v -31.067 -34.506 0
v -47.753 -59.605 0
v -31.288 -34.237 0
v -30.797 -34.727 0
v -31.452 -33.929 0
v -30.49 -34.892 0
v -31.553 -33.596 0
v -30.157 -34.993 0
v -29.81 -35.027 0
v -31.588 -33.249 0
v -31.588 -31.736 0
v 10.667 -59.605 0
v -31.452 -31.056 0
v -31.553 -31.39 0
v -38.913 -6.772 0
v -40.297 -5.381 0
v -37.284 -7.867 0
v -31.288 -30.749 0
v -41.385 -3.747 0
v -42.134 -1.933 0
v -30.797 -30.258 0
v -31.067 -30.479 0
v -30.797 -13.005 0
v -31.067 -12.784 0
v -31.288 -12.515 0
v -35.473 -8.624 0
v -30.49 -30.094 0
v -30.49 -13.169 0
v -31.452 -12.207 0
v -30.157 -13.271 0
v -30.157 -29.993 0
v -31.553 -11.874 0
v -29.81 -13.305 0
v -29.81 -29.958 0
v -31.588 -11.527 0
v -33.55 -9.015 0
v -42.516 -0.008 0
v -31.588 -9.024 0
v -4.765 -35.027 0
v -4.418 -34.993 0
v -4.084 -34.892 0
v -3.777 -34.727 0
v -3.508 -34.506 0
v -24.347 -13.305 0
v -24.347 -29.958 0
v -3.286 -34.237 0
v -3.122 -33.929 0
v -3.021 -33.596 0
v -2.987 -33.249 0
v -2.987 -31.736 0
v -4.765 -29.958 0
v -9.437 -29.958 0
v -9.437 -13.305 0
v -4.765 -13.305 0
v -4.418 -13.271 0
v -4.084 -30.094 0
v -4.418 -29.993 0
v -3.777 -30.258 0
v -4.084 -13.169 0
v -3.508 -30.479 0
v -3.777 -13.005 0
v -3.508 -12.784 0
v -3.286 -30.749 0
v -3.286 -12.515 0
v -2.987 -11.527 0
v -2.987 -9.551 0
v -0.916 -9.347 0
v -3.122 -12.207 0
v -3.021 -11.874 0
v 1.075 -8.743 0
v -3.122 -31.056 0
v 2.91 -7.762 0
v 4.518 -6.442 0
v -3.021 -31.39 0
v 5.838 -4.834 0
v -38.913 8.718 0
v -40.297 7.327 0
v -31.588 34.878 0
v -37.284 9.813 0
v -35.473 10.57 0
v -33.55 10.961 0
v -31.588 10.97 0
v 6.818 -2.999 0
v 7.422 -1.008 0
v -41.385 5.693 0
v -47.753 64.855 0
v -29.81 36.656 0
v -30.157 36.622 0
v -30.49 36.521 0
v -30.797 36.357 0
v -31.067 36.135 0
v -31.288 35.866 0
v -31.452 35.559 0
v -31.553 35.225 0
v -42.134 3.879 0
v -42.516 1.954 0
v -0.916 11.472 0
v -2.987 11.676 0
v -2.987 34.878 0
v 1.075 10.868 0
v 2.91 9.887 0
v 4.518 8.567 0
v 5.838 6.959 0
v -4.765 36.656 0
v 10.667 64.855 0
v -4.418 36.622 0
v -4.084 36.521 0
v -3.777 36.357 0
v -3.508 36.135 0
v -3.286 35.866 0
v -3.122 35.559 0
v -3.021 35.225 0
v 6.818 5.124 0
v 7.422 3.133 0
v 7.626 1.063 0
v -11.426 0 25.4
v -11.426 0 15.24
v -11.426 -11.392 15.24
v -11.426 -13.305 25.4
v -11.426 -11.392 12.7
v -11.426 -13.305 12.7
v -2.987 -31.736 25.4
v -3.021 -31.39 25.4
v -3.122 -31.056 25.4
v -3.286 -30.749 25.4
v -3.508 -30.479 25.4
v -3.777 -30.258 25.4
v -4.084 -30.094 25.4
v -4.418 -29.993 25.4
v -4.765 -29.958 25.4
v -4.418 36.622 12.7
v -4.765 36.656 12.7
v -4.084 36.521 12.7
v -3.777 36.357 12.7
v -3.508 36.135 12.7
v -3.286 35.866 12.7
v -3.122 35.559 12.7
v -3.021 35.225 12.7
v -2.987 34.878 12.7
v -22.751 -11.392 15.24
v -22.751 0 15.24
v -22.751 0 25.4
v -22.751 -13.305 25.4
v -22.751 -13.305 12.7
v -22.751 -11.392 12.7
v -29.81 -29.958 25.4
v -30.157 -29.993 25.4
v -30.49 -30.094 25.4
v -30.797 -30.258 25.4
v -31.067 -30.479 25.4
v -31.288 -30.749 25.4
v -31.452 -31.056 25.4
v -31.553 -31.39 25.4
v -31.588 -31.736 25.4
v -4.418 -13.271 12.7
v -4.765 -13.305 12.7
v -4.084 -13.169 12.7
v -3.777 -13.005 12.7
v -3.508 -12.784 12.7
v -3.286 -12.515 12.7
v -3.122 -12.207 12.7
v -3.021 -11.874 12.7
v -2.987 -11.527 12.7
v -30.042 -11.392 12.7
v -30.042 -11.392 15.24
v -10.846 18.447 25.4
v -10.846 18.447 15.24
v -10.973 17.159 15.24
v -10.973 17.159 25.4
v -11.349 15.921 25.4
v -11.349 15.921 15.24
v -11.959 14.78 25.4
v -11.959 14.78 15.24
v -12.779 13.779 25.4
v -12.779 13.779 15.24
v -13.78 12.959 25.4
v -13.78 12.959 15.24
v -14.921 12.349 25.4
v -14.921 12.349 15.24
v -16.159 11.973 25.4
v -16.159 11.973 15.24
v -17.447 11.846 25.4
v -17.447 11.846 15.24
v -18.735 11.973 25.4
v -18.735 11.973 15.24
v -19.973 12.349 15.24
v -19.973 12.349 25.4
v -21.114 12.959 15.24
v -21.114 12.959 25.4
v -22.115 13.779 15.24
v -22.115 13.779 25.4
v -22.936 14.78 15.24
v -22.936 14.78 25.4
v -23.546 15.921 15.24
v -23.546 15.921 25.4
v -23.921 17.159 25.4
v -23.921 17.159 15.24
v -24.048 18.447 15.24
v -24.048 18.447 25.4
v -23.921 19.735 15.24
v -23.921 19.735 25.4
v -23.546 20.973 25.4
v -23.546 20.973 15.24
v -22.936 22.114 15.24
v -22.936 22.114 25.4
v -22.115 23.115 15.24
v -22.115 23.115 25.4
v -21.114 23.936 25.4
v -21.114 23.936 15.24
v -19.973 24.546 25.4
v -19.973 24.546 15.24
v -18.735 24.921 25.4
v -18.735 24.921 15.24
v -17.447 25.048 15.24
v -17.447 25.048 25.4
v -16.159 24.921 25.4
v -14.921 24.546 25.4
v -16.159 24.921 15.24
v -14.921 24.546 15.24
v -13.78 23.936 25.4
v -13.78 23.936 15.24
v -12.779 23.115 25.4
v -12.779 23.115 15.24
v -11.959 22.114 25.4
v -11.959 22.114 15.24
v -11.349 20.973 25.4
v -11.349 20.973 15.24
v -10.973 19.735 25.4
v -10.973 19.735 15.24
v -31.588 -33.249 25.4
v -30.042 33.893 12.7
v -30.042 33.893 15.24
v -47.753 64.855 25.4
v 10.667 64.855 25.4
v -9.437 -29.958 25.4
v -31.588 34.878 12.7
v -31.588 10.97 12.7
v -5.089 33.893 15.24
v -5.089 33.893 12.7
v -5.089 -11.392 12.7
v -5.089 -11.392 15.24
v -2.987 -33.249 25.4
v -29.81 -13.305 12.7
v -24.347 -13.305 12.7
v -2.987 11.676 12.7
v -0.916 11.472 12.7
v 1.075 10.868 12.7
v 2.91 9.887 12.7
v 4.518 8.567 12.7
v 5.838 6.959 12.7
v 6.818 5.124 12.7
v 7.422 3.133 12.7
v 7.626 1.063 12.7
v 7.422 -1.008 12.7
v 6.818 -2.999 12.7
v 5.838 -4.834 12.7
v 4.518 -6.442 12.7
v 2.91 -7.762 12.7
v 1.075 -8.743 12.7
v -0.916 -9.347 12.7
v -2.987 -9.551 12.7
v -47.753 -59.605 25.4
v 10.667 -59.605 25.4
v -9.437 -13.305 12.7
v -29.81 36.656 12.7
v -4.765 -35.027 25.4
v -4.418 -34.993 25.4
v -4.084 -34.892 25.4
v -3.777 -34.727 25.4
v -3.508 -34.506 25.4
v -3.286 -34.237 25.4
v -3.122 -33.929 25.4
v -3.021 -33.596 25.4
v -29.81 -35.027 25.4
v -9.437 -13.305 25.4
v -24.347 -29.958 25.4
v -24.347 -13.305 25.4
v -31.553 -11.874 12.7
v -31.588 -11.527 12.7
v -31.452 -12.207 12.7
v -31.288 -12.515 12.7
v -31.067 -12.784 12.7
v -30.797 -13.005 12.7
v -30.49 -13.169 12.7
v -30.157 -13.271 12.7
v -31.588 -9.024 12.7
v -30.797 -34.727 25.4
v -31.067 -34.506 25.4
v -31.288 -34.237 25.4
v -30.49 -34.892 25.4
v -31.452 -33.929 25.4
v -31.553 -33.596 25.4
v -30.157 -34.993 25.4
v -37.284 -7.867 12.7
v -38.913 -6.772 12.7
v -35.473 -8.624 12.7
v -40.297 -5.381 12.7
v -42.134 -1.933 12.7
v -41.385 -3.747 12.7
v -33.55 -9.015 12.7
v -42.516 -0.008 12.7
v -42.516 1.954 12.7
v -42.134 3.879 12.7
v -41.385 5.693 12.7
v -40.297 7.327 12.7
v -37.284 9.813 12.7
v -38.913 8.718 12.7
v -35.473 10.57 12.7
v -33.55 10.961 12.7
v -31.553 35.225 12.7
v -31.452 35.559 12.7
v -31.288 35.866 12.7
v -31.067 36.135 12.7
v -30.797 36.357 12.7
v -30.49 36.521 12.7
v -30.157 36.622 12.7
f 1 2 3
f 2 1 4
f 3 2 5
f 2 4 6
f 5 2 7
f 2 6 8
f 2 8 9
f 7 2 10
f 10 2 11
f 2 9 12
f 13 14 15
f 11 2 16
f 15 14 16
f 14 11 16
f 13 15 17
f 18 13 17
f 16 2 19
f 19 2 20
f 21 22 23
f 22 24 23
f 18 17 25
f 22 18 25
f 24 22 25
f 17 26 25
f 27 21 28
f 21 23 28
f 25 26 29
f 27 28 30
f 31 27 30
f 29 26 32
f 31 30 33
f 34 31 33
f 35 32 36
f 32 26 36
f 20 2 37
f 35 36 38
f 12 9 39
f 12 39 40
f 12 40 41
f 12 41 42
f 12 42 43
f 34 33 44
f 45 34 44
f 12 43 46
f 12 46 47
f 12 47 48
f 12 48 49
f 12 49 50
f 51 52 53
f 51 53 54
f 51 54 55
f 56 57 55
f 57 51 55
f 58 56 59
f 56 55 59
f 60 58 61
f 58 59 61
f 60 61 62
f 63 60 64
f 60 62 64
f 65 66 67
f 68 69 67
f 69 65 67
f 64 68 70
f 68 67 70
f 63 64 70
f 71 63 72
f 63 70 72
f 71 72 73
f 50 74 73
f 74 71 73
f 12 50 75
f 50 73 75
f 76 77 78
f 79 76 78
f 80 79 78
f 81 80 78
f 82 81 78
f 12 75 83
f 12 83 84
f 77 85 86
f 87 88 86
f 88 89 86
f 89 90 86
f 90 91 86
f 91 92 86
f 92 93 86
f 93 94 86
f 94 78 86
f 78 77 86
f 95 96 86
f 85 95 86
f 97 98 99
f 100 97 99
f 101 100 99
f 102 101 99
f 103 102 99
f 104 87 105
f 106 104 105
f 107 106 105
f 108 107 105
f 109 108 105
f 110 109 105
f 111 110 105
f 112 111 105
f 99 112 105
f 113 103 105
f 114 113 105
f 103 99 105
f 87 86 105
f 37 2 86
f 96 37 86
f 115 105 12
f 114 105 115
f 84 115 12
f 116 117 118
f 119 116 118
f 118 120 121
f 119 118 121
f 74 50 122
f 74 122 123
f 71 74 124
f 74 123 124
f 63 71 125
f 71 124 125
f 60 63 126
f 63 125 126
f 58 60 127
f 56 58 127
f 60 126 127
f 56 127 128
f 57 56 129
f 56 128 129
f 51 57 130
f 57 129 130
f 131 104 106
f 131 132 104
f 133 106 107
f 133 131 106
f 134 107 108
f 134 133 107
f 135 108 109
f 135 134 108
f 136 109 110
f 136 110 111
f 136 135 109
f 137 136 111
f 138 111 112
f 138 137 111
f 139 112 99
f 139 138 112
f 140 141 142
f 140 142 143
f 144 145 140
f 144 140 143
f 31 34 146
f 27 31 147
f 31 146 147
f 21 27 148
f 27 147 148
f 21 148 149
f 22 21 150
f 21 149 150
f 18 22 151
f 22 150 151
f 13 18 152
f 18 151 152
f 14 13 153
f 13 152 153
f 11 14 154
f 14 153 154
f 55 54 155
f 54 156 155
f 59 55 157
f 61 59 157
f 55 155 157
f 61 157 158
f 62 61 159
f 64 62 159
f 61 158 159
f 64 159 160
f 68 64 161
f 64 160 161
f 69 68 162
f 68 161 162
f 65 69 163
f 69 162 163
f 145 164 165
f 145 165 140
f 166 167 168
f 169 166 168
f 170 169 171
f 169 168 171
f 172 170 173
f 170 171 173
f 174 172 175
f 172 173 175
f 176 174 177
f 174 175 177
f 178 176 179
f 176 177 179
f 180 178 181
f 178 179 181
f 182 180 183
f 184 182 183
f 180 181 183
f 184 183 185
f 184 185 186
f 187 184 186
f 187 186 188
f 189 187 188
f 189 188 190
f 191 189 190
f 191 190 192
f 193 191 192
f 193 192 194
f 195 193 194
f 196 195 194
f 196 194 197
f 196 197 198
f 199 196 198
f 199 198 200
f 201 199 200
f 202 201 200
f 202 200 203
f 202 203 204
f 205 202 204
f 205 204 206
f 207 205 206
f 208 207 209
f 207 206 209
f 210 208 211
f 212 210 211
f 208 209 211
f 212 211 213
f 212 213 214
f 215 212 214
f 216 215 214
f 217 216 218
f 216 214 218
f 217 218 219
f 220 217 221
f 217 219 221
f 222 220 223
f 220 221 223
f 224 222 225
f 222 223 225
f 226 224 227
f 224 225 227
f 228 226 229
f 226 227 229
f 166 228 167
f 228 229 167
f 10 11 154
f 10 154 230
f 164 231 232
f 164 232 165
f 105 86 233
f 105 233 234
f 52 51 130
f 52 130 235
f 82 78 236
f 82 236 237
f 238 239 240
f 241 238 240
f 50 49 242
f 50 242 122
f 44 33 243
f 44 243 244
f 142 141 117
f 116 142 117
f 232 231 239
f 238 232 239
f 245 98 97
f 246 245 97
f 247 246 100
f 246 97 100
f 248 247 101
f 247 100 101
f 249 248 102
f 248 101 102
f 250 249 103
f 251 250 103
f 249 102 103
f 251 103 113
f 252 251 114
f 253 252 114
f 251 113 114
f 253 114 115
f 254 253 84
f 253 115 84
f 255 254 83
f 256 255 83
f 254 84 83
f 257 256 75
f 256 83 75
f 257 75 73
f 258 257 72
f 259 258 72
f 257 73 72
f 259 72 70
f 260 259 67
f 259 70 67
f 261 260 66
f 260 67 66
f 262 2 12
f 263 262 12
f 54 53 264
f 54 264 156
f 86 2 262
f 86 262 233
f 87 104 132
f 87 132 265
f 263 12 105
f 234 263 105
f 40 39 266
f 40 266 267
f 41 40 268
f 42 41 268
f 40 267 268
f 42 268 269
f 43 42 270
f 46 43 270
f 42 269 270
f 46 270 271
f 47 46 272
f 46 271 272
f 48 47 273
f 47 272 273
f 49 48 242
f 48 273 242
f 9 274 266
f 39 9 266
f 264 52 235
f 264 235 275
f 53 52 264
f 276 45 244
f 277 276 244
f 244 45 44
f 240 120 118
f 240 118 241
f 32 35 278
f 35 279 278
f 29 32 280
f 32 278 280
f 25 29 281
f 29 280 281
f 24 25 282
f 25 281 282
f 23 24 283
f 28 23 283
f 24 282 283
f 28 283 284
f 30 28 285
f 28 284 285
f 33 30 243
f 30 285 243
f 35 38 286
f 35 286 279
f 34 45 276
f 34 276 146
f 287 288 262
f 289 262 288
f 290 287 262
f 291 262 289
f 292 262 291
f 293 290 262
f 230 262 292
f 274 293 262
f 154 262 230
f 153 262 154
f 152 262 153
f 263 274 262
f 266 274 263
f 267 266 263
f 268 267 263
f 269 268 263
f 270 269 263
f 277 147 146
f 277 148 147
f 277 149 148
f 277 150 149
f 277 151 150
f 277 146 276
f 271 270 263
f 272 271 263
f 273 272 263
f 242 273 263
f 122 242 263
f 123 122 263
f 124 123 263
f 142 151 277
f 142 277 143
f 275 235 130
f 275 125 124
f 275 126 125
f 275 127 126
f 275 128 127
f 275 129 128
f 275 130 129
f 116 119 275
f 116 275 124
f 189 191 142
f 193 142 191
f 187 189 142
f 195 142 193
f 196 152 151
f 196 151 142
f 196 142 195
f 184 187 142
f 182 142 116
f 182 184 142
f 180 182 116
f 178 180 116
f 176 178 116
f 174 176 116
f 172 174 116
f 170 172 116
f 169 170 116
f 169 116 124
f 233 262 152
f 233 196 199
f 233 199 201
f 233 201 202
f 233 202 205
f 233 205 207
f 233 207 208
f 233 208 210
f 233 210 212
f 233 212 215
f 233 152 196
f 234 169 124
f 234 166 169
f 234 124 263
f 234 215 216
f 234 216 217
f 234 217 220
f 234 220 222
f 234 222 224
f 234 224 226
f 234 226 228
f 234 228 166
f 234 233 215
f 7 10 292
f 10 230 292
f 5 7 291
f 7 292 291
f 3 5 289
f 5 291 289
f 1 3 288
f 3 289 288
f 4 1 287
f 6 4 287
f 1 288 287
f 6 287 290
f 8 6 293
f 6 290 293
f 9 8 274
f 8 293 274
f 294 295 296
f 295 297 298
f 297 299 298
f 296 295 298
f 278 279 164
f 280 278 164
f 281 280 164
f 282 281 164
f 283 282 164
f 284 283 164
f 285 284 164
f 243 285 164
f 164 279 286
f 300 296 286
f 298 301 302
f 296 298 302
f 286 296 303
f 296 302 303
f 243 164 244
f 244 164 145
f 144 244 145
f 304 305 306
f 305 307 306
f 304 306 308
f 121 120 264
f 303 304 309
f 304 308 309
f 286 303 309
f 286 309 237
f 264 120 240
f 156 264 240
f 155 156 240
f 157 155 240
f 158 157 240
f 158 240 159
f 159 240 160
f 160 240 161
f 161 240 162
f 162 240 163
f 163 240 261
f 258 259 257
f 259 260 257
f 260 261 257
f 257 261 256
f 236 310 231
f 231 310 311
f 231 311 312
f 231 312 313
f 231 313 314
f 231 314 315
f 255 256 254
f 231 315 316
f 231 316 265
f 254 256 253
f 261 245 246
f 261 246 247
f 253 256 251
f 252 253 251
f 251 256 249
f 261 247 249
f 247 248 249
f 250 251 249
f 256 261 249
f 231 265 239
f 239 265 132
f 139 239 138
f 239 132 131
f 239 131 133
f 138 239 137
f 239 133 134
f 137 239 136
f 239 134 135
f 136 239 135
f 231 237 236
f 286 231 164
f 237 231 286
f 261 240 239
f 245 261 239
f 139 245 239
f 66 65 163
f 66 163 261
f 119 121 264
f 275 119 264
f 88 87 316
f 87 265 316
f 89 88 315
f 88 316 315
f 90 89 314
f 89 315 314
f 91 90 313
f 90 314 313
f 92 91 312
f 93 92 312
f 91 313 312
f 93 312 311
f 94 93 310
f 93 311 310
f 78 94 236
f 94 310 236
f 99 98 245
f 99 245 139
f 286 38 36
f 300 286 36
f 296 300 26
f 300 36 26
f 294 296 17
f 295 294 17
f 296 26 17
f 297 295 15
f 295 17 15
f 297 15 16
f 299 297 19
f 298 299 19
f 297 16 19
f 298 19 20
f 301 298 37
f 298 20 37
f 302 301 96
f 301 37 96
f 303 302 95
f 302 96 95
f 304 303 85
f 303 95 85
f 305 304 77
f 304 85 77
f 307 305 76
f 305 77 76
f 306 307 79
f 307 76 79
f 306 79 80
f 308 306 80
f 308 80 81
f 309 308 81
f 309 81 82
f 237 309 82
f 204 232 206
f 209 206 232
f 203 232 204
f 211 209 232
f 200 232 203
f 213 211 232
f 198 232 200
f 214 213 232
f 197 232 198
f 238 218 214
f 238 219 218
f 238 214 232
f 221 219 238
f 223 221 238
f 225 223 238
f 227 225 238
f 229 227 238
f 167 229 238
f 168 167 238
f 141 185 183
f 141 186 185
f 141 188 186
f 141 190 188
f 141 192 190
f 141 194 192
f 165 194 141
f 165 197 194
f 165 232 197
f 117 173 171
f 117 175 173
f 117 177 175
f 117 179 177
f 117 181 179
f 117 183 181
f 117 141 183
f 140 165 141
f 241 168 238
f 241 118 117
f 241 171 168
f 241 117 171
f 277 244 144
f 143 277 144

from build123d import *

# Parameters (mm, degrees)
F0_W      = 58.42
F0_H      = 124.46
F1_DEPTH  = 25.4
F3_DEPTH  = 12.7
F2_W      = 14.9100571871
F2_H      = 16.6536653414
F4_DEPTH  = 25.401
F5_DEPTH  = 25.401
F6_R      = 1.778
F8_DEPTH  = 12.7
F9_R      = 6.600990786
F10_DEPTH = 12.701
F12_W     = 24.9527078122
F12_H     = 45.2845413238
F13_DEPTH = 2.54
F14_W     = 11.3247931004
F14_H     = 17.1568840742
F15_DEPTH = 12.701


with BuildPart() as f1:
    # F0 (on Top) → F1 (new body)
    with BuildSketch(Plane.XY):
        with Locations((-18.5432793882, 2.6247613132)):
            Rectangle(F0_W, F0_H)
    extrude(amount=F1_DEPTH)

    # F2 (on Top) → F3 (cut)
    with BuildSketch(Plane.XY):
        Polygon((-2.9867999256, 36.6561636329), (-31.5876603127, 36.6561636329), (-31.5876603127, -13.3048305288), (-24.3469346315, -13.3048305288), (-9.4368774444, -13.3048305288), (-2.9867999256, -13.3048305288), align=None)
    extrude(amount=F3_DEPTH, mode=Mode.SUBTRACT)

    # F2 (on Top) → F4 (cut, through all)
    with BuildSketch(Plane.XY):
        with Locations((-16.8919060379, -21.6316631995)):
            Rectangle(F2_W, F2_H)
    extrude(amount=F4_DEPTH, mode=Mode.SUBTRACT)

    # F2 (on Top) → F5 (cut, through all)
    with BuildSketch(Plane.XY):
        Polygon((-9.4368774444, -29.9584958702), (-24.3469346315, -29.9584958702), (-31.5876603127, -29.9584958702), (-31.5876603127, -35.0270010531), (-2.9867999256, -35.0270010531), (-2.9867999256, -29.9584958702), align=None)
    extrude(amount=F5_DEPTH, mode=Mode.SUBTRACT)

    # F6
    f6_edges = [f1.edges().sort_by_distance(p)[0] for p in [
        (-2.9868, -35.027001, 12.7),
        (-2.9868, -13.304831, 6.35),
        (-2.9868, -29.958496, 12.7),
        (-2.9868, 36.656164, 6.35),
        (-31.58766, 36.656164, 6.35),
        (-31.58766, -13.304831, 6.35),
        (-31.58766, -29.958496, 12.7),
        (-31.58766, -35.027001, 12.7),
    ]]
    fillet(f6_edges, radius=F6_R)

    # F7 (on face) → F8 (cut)
    with BuildSketch(Plane(origin=(0, 0, 0), x_dir=(1, 0, 0), z_dir=(0, 0, -1))):
        with BuildLine():
            Line((-31.5876603127, -10.9698253981), (-31.5876603127, 9.0240317161))
            ThreePointArc((-31.5876603127, 9.0240317161), (-42.5635968021, -0.972896841), (-31.5876603127, -10.9698253981))
        make_face()
        with BuildLine():
            Line((-2.9867999256, 9.5505814534), (-2.9867999256, -11.675666552))
            ThreePointArc((-2.9867999256, -11.675666552), (7.6263240771, -1.0625425493), (-2.9867999256, 9.5505814534))
        make_face()
    extrude(amount=-F8_DEPTH, mode=Mode.SUBTRACT)

    # F9 (on face) → F10 (cut, through all)
    with BuildSketch(Plane(origin=(0, 0, 12.7), x_dir=(1, 0, 0), z_dir=(0, 0, -1))):
        with Locations((-17.4470897764, -18.4470508248)):
            Circle(F9_R)
    extrude(amount=-F10_DEPTH, mode=Mode.SUBTRACT)

    # F12 (on face) → F13 (cut)
    with BuildSketch(Plane(origin=(0, 0, 12.7), x_dir=(1, 0, 0), z_dir=(0, 0, -1))):
        with Locations((-17.5654711202, -11.2502751872)):
            Rectangle(F12_W, F12_H)
    extrude(amount=-F13_DEPTH, mode=Mode.SUBTRACT)

    # F14 (on face) → F15 (cut, through all)
    with BuildSketch(Plane(origin=(0, 0, 12.7), x_dir=(1, 0, 0), z_dir=(0, 0, -1))):
        with Locations((-17.0887093991, 8.5784420371)):
            Rectangle(F14_W, F14_H)
    extrude(amount=-F15_DEPTH, mode=Mode.SUBTRACT)


solid = f1.part
